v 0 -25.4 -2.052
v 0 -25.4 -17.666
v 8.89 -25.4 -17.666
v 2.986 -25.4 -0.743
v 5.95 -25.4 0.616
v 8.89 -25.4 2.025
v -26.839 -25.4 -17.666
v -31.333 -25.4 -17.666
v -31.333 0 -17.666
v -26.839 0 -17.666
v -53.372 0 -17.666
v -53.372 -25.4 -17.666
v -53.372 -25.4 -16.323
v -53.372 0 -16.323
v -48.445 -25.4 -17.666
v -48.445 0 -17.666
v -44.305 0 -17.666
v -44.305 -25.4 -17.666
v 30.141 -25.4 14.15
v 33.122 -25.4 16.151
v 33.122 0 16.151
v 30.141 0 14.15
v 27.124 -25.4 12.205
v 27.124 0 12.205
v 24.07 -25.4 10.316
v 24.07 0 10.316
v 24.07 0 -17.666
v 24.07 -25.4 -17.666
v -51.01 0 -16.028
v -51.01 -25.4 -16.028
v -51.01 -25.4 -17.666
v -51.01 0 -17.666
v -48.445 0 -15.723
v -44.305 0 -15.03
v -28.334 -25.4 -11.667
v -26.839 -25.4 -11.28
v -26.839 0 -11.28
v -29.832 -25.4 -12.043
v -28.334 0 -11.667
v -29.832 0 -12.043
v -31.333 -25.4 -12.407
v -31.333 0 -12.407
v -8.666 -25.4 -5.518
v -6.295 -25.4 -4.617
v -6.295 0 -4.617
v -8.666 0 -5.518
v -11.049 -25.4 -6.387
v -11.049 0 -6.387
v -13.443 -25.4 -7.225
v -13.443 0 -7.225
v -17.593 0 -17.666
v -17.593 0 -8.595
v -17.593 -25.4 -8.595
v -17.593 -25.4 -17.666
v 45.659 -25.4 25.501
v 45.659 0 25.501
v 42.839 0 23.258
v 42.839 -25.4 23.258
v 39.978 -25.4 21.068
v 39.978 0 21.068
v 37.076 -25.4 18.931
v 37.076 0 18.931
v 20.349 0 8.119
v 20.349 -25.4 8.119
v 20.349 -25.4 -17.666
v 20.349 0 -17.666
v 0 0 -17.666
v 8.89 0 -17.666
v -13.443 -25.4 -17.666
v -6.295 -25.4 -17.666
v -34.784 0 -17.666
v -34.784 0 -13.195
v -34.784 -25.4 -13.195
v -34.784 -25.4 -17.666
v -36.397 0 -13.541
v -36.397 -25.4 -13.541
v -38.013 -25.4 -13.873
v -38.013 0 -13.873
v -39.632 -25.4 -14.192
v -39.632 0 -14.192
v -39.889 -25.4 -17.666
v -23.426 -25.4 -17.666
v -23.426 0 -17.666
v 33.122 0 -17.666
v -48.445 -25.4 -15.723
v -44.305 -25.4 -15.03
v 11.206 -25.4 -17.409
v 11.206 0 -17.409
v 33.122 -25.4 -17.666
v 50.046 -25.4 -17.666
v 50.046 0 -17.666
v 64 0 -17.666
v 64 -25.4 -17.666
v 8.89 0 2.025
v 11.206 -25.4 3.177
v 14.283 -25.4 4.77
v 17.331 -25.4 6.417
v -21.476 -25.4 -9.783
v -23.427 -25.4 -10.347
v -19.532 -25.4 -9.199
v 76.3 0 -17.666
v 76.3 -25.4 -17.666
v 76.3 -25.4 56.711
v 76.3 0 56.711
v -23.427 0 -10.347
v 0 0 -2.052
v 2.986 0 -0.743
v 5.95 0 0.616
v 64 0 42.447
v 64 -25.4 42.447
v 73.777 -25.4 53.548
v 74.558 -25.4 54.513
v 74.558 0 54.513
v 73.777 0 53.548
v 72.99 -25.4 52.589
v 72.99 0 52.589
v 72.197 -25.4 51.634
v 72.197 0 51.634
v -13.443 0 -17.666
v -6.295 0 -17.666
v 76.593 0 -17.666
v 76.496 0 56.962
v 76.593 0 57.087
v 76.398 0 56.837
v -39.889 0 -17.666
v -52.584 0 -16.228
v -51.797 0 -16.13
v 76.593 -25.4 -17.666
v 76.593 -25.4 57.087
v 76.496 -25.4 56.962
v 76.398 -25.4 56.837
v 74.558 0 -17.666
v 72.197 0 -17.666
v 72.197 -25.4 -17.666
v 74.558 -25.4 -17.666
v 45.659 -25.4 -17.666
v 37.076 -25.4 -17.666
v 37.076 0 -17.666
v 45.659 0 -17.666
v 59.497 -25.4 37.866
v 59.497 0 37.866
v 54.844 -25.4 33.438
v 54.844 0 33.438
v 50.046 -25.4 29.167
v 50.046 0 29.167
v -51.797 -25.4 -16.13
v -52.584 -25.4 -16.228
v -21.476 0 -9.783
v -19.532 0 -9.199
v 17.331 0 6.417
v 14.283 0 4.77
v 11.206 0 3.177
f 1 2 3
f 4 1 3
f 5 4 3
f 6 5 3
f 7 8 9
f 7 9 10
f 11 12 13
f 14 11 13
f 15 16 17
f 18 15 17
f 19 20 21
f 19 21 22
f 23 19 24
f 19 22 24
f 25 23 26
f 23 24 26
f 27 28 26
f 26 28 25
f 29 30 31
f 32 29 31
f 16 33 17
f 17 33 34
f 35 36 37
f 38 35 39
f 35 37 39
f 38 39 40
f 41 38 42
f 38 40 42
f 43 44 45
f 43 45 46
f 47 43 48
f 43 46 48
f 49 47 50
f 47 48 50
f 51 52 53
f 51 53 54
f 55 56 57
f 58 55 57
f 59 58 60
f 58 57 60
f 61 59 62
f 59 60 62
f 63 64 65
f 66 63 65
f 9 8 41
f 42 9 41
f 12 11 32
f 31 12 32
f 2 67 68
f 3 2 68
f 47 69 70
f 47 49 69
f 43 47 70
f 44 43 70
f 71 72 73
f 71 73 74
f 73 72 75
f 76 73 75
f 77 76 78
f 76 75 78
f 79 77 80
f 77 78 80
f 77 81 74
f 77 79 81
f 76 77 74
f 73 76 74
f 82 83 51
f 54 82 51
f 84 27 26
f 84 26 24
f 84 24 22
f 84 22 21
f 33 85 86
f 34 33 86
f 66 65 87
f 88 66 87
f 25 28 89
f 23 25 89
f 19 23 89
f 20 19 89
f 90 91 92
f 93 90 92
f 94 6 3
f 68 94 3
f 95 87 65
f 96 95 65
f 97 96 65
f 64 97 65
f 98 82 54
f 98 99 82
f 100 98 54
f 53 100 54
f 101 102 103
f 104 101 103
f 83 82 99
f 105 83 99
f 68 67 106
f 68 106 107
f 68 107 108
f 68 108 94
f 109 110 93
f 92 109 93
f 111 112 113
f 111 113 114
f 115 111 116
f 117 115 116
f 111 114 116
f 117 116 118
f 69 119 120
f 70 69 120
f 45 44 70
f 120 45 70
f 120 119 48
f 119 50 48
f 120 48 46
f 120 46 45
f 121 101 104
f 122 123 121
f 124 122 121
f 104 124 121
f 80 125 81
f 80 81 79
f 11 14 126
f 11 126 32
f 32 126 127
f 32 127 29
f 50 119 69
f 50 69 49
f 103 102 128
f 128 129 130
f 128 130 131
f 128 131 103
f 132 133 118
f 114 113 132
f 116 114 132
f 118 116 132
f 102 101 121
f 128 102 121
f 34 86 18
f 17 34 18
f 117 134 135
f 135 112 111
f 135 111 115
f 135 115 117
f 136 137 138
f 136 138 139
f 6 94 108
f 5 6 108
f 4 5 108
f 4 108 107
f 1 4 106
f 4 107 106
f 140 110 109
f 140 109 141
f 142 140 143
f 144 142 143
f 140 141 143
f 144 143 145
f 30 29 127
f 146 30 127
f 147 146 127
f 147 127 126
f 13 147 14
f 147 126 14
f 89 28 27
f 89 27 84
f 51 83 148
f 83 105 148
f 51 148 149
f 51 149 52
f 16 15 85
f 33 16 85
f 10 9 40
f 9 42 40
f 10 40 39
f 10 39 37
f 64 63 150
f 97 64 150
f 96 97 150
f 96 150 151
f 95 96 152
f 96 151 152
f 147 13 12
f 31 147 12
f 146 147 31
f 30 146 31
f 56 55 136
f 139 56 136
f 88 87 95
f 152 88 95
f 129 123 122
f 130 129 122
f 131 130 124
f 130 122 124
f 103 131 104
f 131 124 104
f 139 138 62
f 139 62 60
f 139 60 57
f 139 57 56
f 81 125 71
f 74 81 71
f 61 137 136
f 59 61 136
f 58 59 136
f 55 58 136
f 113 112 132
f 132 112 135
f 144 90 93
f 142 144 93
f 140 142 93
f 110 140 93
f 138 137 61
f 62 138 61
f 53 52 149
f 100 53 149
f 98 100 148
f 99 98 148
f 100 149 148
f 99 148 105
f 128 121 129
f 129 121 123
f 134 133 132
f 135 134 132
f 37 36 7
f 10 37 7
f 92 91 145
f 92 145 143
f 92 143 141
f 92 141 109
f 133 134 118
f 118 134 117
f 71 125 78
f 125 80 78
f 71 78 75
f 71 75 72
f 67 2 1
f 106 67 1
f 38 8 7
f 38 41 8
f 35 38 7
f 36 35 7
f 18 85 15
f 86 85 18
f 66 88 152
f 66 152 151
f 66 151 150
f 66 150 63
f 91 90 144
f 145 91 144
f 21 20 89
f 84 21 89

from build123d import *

# Parameters (mm, degrees)
F1_DEPTH = 25.4
F3_DEPTH = 25.4


with BuildPart() as f1:
    # F0 (on Front) → F1 (new body)
    with BuildSketch(Plane.XZ):
        with BuildLine():
            ThreePointArc((76.59304142, 57.0874288678), (8.8901100465, 2.0245590037), (-76.1267766356, -17.6664423198))
            Line((-76.1267766356, -17.6664423198), (76.59304142, -17.6664423198))
            Line((76.59304142, -17.6664423198), (76.59304142, 57.0874288678))
        make_face()
    extrude(amount=F1_DEPTH)

    # F2 (on face) → F3 (cut)
    with BuildSketch(Plane.XZ.offset(25.4)):
        with BuildLine():
            Line((50.0460880919, -17.6664423198), (50.0460880919, 29.1665339536))
            ThreePointArc((50.0460880919, 29.1665339536), (49.2865848333, 28.5160253175), (48.5237278044, 27.8694529403))
            Line((48.5237278044, 27.8694529403), (48.5237278044, -17.6664423198))
            Line((48.5237278044, -17.6664423198), (50.0460880919, -17.6664423198))
        make_face()
        with BuildLine():
            Line((72.196634241, -17.6664423198), (72.196634241, 51.6341854121))
            ThreePointArc((72.196634241, 51.6341854121), (68.171515479, 46.9752655202), (64.0001222491, 42.4468448099))
            Line((64.0001222491, 42.4468448099), (64.0001222491, -17.6664423198))
            Line((64.0001222491, -17.6664423198), (72.196634241, -17.6664423198))
        make_face()
        with BuildLine():
            Line((76.3001332536, -17.6664423198), (76.3001332536, 56.7112886619))
            ThreePointArc((76.3001332536, 56.7112886619), (75.4330330198, 55.6088876943), (74.5579600334, 54.5128046785))
            Line((74.5579600334, 54.5128046785), (74.5579600334, -17.6664423198))
            Line((74.5579600334, -17.6664423198), (76.3001332536, -17.6664423198))
        make_face()
        with BuildLine():
            Line((48.5237278044, -17.6664423198), (48.5237278044, 27.8694529403))
            ThreePointArc((48.5237278044, 27.8694529403), (47.0971842769, 26.6783666373), (45.6592600747, 25.5010446737))
            Line((45.6592600747, 25.5010446737), (45.6592600747, -17.6664423198))
            Line((45.6592600747, -17.6664423198), (48.5237278044, -17.6664423198))
        make_face()
        with BuildLine():
            Line((37.076305598, -17.6664423198), (37.076305598, 18.9311340043))
            ThreePointArc((37.076305598, 18.9311340043), (35.1080145579, 17.5285599975), (33.1223477918, 16.1506953606))
            Line((33.1223477918, 16.1506953606), (33.1223477918, -17.6664423198))
            Line((33.1223477918, -17.6664423198), (37.076305598, -17.6664423198))
        make_face()
        with BuildLine():
            Line((24.0702610463, -17.6664423198), (24.0702610463, 10.3162872077))
            ThreePointArc((24.0702610463, 10.3162872077), (22.2159399407, 9.2070463023), (20.3493403318, 8.1185941677))
            Line((20.3493403318, 8.1185941677), (20.3493403318, -17.6664423198))
            Line((20.3493403318, -17.6664423198), (24.0702610463, -17.6664423198))
        make_face()
        with BuildLine():
            Line((8.8901100465, -17.6664423198), (20.3493403318, -17.6664423198))
            Line((20.3493403318, -17.6664423198), (11.2055828795, -17.4092557281))
            Line((11.2055828795, -17.4092557281), (11.2055828795, 3.1772041735))
            ThreePointArc((11.2055828795, 3.1772041735), (10.0497736197, 2.5970102506), (8.8901100465, 2.0245590037))
            Line((8.8901100465, 2.0245590037), (8.8901100465, -17.6664423198))
        make_face()
        with BuildLine():
            Line((-6.294675277, -17.6664423198), (0, -17.6664423198))
            Line((0, -17.6664423198), (0, -2.0516548377))
            ThreePointArc((0, -2.0516548377), (-3.1360632023, -3.3621757956), (-6.294675277, -4.6173759199))
            Line((-6.294675277, -4.6173759199), (-6.294675277, -17.6664423198))
        make_face()
        with BuildLine():
            Line((-17.5933878889, -17.6664423198), (-13.4434849024, -17.6664423198))
            Line((-13.4434849024, -17.6664423198), (-13.4434849024, -7.2251867219))
            ThreePointArc((-13.4434849024, -7.2251867219), (-15.5145668718, -7.9217937766), (-17.5933878889, -8.5949543012))
            Line((-17.5933878889, -8.5949543012), (-17.5933878889, -17.6664423198))
        make_face()
        with BuildLine():
            Line((-26.8389031026, -17.6664423198), (-23.4255289083, -17.6664423198))
            Line((-23.4255289083, -17.6664423198), (-23.4266159351, -10.3468782596))
            ThreePointArc((-23.4266159351, -10.3468782596), (-25.1306262848, -10.8211239727), (-26.8389031026, -11.2797638987))
            Line((-26.8389031026, -11.2797638987), (-26.8389031026, -17.6664423198))
        make_face()
        with BuildLine():
            Line((-34.7836675341, -17.6664423198), (-31.3333794475, -17.6664423198))
            Line((-31.3333794475, -17.6664423198), (-31.3333794475, -12.4070239519))
            ThreePointArc((-31.3333794475, -12.4070239519), (-33.0567201062, -12.8090500719), (-34.7836675341, -13.1952891283))
            Line((-34.7836675341, -13.1952891283), (-34.7836675341, -17.6664423198))
        make_face()
        with BuildLine():
            Line((-44.3052338714, -17.6664423198), (-39.8894175887, -17.6664423198))
            Line((-39.8894175887, -17.6664423198), (-39.6319529987, -14.191516572))
            ThreePointArc((-39.6319529987, -14.191516572), (-41.9660191721, -14.6252294951), (-44.3052338714, -15.0302559042))
            Line((-44.3052338714, -15.0302559042), (-44.3052338714, -17.6664423198))
        make_face()
        with BuildLine():
            Line((-48.44545573, -15.7227534801), (-44.3052338714, -15.0302559042))
            ThreePointArc((-44.3052338714, -15.0302559042), (-47.6531743525, -15.5586809271), (-51.0098620749, -16.0283467695))
            Line((-51.0098620749, -16.0283467695), (-51.0098620749, -17.6664423198))
            Line((-51.0098620749, -17.6664423198), (-48.44545573, -17.6664423198))
            Line((-48.44545573, -17.6664423198), (-48.44545573, -15.7227534801))
        make_face()
        with BuildLine():
            Line((-53.3716566861, -17.6664423198), (-53.3716566861, -16.3229573596))
            ThreePointArc((-53.3716566861, -16.3229573596), (-64.7294037393, -17.3302788905), (-76.1267766356, -17.6664423198))
            Line((-76.1267766356, -17.6664423198), (-53.3716566861, -17.6664423198))
        make_face()
    extrude(amount=-F3_DEPTH, mode=Mode.SUBTRACT)


solid = f1.part
